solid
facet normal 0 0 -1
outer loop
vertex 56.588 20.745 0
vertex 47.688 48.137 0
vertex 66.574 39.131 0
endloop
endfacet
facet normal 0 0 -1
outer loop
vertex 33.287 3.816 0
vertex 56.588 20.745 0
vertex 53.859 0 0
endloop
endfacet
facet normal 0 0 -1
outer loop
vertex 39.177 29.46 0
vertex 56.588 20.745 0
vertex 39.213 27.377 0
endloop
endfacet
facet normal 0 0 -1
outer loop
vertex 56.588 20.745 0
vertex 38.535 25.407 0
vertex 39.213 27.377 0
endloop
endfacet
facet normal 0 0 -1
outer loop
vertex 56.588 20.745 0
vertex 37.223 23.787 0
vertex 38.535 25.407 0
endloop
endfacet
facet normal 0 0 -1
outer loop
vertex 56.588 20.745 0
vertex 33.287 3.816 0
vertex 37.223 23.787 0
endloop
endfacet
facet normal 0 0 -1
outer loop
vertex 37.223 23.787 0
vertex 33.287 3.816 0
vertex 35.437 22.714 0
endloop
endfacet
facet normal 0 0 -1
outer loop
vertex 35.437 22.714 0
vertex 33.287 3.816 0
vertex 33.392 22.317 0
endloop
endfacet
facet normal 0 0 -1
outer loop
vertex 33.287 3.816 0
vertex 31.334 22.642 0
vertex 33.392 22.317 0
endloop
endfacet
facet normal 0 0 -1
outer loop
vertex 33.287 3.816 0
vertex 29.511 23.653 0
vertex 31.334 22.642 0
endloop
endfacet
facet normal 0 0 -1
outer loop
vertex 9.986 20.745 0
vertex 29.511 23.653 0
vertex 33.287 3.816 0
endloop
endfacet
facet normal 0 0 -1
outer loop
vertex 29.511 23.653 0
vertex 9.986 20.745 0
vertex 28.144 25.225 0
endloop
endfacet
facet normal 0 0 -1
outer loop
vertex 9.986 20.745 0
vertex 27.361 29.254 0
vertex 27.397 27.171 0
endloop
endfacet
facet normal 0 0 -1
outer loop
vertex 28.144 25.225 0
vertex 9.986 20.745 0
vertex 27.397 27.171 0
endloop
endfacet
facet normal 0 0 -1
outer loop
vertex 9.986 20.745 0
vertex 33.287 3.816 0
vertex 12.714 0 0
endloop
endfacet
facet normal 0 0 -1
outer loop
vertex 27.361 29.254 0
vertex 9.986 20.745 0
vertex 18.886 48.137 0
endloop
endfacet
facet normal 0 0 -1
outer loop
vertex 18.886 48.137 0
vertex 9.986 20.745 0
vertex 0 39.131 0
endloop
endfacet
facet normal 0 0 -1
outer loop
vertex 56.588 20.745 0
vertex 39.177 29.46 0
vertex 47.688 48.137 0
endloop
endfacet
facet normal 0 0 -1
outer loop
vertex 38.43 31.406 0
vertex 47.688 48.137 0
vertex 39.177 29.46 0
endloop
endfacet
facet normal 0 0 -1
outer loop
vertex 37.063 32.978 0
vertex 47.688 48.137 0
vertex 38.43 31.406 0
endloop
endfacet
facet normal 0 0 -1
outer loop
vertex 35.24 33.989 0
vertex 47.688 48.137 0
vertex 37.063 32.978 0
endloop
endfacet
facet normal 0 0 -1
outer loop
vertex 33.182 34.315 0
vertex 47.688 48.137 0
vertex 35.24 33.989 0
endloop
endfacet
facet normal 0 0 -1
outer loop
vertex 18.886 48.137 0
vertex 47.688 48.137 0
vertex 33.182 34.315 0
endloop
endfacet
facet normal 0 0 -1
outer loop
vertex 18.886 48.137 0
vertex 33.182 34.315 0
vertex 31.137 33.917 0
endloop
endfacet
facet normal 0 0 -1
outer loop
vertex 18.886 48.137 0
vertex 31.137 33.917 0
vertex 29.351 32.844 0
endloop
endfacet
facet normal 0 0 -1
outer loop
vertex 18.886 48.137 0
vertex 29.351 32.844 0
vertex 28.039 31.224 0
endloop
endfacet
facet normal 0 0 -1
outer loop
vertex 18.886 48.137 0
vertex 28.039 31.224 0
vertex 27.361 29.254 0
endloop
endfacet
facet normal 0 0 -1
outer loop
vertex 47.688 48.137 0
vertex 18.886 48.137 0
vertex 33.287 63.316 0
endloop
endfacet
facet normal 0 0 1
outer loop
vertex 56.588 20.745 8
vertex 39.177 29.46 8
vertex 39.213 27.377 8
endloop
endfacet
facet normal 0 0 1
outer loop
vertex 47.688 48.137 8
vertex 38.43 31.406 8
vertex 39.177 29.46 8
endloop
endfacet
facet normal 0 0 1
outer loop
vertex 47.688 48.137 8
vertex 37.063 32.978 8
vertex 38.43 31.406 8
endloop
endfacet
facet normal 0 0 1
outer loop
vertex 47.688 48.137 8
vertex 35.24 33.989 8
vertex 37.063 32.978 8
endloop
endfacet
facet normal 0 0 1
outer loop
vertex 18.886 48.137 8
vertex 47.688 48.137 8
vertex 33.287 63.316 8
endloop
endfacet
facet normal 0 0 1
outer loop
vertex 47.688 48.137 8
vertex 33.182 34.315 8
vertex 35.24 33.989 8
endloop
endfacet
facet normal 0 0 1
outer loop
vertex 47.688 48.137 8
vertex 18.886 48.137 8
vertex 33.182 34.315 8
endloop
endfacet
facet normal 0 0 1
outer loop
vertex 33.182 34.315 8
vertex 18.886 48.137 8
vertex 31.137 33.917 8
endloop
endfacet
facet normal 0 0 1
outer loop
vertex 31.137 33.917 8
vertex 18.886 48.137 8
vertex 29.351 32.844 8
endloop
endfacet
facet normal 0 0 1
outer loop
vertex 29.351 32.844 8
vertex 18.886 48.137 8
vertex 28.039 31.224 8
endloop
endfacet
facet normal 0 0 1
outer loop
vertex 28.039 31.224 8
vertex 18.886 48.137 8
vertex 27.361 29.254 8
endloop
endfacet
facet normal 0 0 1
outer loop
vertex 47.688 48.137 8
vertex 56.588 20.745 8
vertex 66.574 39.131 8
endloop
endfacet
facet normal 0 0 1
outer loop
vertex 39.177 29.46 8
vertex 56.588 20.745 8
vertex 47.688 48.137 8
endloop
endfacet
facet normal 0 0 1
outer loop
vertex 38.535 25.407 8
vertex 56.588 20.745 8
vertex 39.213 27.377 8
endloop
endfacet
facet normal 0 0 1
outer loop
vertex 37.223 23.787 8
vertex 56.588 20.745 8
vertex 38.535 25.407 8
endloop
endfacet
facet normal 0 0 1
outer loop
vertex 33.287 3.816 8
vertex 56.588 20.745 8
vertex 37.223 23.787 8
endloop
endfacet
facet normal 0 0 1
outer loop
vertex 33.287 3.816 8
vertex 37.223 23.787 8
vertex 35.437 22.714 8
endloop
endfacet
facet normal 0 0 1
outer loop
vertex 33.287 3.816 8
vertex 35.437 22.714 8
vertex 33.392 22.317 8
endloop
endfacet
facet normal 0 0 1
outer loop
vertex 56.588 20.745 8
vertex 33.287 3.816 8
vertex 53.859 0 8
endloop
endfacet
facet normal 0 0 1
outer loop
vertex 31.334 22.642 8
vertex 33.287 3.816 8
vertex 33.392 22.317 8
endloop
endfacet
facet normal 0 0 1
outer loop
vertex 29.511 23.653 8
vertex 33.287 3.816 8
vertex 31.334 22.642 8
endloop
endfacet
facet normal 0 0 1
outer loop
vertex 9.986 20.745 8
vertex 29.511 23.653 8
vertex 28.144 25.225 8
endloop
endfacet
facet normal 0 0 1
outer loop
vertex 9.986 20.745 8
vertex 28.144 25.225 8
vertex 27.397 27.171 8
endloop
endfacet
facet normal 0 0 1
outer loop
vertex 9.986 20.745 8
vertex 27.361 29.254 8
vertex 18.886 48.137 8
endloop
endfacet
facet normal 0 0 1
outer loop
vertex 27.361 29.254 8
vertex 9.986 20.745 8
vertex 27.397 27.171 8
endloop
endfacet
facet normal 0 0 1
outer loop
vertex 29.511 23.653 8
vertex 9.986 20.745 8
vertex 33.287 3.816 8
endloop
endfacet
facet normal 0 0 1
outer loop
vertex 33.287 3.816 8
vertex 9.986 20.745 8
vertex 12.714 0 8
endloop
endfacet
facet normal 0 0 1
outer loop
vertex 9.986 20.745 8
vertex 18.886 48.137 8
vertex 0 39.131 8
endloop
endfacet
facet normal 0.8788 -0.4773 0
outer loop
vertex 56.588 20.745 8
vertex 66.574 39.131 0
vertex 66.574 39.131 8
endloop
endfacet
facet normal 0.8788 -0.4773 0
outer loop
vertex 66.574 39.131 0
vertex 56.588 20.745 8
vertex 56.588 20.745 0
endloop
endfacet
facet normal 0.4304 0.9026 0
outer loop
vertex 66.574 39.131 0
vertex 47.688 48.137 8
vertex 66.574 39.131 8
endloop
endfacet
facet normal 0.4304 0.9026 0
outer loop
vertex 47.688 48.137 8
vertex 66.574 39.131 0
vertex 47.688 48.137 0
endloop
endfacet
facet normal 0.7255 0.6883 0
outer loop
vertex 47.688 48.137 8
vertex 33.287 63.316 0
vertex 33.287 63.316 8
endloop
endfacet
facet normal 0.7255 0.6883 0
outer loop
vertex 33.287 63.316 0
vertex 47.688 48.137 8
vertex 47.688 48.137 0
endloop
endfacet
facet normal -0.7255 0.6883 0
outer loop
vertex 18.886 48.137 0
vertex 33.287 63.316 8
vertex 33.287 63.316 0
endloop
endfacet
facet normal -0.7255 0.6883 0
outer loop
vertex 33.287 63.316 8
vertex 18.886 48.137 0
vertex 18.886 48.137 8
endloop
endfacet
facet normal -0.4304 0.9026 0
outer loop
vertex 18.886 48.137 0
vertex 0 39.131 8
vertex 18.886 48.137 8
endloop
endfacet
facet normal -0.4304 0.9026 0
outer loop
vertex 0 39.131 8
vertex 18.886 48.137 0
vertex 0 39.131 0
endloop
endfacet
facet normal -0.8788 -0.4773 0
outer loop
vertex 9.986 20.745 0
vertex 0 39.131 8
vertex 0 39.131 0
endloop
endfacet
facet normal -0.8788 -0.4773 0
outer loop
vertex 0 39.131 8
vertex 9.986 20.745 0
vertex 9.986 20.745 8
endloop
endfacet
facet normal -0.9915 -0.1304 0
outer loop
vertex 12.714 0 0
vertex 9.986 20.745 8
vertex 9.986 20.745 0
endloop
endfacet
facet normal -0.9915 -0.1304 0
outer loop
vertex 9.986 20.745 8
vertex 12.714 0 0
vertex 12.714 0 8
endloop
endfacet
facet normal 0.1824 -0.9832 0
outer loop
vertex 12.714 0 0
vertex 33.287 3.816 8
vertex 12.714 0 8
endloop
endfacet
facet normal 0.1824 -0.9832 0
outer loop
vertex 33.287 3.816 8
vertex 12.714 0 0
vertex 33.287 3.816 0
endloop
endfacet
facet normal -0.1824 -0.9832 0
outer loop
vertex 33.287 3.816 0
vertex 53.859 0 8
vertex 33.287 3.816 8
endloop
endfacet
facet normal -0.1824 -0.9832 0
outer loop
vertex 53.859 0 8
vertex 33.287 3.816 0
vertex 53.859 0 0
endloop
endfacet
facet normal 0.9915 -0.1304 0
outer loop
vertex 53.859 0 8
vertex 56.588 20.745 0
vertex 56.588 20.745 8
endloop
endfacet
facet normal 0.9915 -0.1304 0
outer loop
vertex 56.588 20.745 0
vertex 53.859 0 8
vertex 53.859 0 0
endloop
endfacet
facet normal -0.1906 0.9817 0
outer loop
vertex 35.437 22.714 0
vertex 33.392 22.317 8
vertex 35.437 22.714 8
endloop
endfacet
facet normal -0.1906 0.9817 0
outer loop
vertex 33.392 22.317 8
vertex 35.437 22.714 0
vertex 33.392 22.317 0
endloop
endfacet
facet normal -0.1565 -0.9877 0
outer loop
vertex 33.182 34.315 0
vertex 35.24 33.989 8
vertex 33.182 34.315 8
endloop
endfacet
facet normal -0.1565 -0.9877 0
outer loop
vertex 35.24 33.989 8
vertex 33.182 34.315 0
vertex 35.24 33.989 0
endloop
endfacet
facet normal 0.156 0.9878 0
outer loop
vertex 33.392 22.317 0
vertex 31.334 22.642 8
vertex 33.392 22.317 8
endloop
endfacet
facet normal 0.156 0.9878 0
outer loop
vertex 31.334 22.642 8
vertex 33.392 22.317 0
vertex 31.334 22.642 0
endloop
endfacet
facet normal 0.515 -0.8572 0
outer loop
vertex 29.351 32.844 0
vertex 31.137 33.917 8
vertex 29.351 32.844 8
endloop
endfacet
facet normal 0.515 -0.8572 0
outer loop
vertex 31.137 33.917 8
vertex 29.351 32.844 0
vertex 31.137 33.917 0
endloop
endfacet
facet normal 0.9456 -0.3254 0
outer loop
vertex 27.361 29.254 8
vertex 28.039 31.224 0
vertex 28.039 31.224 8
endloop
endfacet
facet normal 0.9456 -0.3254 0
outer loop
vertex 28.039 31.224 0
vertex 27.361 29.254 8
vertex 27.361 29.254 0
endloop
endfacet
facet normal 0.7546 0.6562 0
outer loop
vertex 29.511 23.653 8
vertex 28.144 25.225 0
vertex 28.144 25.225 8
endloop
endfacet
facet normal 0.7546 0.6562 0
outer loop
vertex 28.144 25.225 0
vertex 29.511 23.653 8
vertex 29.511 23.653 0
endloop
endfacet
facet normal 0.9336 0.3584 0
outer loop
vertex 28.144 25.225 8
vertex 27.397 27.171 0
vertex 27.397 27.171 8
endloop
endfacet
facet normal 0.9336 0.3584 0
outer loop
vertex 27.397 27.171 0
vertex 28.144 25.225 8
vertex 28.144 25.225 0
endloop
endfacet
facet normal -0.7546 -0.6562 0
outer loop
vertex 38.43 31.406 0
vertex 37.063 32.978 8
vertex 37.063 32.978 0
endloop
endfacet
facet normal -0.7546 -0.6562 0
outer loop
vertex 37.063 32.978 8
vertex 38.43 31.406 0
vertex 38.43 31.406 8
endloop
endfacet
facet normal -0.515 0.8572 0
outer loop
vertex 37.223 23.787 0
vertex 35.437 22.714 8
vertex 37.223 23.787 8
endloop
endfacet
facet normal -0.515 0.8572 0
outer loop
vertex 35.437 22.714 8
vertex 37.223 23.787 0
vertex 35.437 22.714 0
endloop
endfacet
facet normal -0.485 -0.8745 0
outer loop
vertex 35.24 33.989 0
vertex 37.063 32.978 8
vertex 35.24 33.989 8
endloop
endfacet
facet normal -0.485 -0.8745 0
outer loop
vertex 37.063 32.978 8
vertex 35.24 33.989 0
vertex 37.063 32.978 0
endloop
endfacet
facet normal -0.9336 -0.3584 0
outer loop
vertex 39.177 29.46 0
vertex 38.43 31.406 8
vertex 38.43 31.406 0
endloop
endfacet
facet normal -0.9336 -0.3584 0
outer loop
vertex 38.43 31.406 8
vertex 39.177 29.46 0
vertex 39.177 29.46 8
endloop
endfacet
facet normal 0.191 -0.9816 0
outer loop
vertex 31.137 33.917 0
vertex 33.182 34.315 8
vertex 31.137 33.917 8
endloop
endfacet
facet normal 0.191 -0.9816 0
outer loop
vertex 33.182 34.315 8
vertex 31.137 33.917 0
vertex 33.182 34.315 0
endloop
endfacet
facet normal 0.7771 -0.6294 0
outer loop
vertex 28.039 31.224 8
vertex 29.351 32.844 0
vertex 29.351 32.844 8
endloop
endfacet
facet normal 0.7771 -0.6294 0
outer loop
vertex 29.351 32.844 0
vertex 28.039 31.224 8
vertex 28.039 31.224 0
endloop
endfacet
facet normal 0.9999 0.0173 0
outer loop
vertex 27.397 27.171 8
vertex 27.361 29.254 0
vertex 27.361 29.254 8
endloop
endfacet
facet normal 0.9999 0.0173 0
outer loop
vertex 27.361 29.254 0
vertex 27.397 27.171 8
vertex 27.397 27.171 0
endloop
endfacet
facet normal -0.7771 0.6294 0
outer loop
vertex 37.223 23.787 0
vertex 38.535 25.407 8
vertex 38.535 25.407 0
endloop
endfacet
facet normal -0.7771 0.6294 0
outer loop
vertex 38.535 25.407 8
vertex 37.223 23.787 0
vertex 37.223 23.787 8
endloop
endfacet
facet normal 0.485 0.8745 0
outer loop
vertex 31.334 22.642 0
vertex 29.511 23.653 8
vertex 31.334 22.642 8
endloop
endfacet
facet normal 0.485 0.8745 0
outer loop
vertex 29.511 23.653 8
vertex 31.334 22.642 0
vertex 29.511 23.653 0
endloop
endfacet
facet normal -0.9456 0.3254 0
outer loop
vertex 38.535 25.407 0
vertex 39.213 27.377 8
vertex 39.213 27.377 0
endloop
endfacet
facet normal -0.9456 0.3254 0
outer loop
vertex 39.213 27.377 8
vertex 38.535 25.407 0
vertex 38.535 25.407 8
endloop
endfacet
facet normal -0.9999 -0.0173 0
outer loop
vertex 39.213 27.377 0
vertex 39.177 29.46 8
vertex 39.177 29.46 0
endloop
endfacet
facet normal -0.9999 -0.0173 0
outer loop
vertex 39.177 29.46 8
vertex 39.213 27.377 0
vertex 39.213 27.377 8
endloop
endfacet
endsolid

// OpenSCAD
$fn = 32;

// ----------------------------------------------------------------------
// Star wheel: 5-point blunt, R35
// ----------------------------------------------------------------------

// --- parameters (mm) ---
n_points = 5;             // number of points / teeth
r_out = 35;               // tip radius
r_in = 24.5;              // root radius
bore_r = 6;               // centre bore radius
plate_t = 8;              // plate thickness, Z (extrusion height)
bore_d = 12;              // centre bore diameter

profile = [[33.287, 63.316], [18.886, 48.137], [0, 39.131], [9.986, 20.745], [12.714, 0], [33.287, 3.816], [53.859, 0], [56.588, 20.745], [66.574, 39.131], [47.688, 48.137]];  // primary outline, 10 points, counter clockwise
void_1 = [[39.177, 29.46], [38.43, 31.406], [37.063, 32.978], [35.24, 33.989], [33.182, 34.315], [31.137, 33.917], [29.351, 32.844], [28.039, 31.224], [27.361, 29.254], [27.397, 27.171], [28.144, 25.225], [29.511, 23.653], [31.334, 22.642], [33.392, 22.317], [35.437, 22.714], [37.223, 23.787], [38.535, 25.407], [39.213, 27.377]];  // centre bore, 18 points

// --- the one profile operation ---
difference() {
  linear_extrude(height = plate_t) polygon(points = profile);
  translate([0, 0, -1])
    linear_extrude(height = plate_t + 2) polygon(points = void_1);
}
